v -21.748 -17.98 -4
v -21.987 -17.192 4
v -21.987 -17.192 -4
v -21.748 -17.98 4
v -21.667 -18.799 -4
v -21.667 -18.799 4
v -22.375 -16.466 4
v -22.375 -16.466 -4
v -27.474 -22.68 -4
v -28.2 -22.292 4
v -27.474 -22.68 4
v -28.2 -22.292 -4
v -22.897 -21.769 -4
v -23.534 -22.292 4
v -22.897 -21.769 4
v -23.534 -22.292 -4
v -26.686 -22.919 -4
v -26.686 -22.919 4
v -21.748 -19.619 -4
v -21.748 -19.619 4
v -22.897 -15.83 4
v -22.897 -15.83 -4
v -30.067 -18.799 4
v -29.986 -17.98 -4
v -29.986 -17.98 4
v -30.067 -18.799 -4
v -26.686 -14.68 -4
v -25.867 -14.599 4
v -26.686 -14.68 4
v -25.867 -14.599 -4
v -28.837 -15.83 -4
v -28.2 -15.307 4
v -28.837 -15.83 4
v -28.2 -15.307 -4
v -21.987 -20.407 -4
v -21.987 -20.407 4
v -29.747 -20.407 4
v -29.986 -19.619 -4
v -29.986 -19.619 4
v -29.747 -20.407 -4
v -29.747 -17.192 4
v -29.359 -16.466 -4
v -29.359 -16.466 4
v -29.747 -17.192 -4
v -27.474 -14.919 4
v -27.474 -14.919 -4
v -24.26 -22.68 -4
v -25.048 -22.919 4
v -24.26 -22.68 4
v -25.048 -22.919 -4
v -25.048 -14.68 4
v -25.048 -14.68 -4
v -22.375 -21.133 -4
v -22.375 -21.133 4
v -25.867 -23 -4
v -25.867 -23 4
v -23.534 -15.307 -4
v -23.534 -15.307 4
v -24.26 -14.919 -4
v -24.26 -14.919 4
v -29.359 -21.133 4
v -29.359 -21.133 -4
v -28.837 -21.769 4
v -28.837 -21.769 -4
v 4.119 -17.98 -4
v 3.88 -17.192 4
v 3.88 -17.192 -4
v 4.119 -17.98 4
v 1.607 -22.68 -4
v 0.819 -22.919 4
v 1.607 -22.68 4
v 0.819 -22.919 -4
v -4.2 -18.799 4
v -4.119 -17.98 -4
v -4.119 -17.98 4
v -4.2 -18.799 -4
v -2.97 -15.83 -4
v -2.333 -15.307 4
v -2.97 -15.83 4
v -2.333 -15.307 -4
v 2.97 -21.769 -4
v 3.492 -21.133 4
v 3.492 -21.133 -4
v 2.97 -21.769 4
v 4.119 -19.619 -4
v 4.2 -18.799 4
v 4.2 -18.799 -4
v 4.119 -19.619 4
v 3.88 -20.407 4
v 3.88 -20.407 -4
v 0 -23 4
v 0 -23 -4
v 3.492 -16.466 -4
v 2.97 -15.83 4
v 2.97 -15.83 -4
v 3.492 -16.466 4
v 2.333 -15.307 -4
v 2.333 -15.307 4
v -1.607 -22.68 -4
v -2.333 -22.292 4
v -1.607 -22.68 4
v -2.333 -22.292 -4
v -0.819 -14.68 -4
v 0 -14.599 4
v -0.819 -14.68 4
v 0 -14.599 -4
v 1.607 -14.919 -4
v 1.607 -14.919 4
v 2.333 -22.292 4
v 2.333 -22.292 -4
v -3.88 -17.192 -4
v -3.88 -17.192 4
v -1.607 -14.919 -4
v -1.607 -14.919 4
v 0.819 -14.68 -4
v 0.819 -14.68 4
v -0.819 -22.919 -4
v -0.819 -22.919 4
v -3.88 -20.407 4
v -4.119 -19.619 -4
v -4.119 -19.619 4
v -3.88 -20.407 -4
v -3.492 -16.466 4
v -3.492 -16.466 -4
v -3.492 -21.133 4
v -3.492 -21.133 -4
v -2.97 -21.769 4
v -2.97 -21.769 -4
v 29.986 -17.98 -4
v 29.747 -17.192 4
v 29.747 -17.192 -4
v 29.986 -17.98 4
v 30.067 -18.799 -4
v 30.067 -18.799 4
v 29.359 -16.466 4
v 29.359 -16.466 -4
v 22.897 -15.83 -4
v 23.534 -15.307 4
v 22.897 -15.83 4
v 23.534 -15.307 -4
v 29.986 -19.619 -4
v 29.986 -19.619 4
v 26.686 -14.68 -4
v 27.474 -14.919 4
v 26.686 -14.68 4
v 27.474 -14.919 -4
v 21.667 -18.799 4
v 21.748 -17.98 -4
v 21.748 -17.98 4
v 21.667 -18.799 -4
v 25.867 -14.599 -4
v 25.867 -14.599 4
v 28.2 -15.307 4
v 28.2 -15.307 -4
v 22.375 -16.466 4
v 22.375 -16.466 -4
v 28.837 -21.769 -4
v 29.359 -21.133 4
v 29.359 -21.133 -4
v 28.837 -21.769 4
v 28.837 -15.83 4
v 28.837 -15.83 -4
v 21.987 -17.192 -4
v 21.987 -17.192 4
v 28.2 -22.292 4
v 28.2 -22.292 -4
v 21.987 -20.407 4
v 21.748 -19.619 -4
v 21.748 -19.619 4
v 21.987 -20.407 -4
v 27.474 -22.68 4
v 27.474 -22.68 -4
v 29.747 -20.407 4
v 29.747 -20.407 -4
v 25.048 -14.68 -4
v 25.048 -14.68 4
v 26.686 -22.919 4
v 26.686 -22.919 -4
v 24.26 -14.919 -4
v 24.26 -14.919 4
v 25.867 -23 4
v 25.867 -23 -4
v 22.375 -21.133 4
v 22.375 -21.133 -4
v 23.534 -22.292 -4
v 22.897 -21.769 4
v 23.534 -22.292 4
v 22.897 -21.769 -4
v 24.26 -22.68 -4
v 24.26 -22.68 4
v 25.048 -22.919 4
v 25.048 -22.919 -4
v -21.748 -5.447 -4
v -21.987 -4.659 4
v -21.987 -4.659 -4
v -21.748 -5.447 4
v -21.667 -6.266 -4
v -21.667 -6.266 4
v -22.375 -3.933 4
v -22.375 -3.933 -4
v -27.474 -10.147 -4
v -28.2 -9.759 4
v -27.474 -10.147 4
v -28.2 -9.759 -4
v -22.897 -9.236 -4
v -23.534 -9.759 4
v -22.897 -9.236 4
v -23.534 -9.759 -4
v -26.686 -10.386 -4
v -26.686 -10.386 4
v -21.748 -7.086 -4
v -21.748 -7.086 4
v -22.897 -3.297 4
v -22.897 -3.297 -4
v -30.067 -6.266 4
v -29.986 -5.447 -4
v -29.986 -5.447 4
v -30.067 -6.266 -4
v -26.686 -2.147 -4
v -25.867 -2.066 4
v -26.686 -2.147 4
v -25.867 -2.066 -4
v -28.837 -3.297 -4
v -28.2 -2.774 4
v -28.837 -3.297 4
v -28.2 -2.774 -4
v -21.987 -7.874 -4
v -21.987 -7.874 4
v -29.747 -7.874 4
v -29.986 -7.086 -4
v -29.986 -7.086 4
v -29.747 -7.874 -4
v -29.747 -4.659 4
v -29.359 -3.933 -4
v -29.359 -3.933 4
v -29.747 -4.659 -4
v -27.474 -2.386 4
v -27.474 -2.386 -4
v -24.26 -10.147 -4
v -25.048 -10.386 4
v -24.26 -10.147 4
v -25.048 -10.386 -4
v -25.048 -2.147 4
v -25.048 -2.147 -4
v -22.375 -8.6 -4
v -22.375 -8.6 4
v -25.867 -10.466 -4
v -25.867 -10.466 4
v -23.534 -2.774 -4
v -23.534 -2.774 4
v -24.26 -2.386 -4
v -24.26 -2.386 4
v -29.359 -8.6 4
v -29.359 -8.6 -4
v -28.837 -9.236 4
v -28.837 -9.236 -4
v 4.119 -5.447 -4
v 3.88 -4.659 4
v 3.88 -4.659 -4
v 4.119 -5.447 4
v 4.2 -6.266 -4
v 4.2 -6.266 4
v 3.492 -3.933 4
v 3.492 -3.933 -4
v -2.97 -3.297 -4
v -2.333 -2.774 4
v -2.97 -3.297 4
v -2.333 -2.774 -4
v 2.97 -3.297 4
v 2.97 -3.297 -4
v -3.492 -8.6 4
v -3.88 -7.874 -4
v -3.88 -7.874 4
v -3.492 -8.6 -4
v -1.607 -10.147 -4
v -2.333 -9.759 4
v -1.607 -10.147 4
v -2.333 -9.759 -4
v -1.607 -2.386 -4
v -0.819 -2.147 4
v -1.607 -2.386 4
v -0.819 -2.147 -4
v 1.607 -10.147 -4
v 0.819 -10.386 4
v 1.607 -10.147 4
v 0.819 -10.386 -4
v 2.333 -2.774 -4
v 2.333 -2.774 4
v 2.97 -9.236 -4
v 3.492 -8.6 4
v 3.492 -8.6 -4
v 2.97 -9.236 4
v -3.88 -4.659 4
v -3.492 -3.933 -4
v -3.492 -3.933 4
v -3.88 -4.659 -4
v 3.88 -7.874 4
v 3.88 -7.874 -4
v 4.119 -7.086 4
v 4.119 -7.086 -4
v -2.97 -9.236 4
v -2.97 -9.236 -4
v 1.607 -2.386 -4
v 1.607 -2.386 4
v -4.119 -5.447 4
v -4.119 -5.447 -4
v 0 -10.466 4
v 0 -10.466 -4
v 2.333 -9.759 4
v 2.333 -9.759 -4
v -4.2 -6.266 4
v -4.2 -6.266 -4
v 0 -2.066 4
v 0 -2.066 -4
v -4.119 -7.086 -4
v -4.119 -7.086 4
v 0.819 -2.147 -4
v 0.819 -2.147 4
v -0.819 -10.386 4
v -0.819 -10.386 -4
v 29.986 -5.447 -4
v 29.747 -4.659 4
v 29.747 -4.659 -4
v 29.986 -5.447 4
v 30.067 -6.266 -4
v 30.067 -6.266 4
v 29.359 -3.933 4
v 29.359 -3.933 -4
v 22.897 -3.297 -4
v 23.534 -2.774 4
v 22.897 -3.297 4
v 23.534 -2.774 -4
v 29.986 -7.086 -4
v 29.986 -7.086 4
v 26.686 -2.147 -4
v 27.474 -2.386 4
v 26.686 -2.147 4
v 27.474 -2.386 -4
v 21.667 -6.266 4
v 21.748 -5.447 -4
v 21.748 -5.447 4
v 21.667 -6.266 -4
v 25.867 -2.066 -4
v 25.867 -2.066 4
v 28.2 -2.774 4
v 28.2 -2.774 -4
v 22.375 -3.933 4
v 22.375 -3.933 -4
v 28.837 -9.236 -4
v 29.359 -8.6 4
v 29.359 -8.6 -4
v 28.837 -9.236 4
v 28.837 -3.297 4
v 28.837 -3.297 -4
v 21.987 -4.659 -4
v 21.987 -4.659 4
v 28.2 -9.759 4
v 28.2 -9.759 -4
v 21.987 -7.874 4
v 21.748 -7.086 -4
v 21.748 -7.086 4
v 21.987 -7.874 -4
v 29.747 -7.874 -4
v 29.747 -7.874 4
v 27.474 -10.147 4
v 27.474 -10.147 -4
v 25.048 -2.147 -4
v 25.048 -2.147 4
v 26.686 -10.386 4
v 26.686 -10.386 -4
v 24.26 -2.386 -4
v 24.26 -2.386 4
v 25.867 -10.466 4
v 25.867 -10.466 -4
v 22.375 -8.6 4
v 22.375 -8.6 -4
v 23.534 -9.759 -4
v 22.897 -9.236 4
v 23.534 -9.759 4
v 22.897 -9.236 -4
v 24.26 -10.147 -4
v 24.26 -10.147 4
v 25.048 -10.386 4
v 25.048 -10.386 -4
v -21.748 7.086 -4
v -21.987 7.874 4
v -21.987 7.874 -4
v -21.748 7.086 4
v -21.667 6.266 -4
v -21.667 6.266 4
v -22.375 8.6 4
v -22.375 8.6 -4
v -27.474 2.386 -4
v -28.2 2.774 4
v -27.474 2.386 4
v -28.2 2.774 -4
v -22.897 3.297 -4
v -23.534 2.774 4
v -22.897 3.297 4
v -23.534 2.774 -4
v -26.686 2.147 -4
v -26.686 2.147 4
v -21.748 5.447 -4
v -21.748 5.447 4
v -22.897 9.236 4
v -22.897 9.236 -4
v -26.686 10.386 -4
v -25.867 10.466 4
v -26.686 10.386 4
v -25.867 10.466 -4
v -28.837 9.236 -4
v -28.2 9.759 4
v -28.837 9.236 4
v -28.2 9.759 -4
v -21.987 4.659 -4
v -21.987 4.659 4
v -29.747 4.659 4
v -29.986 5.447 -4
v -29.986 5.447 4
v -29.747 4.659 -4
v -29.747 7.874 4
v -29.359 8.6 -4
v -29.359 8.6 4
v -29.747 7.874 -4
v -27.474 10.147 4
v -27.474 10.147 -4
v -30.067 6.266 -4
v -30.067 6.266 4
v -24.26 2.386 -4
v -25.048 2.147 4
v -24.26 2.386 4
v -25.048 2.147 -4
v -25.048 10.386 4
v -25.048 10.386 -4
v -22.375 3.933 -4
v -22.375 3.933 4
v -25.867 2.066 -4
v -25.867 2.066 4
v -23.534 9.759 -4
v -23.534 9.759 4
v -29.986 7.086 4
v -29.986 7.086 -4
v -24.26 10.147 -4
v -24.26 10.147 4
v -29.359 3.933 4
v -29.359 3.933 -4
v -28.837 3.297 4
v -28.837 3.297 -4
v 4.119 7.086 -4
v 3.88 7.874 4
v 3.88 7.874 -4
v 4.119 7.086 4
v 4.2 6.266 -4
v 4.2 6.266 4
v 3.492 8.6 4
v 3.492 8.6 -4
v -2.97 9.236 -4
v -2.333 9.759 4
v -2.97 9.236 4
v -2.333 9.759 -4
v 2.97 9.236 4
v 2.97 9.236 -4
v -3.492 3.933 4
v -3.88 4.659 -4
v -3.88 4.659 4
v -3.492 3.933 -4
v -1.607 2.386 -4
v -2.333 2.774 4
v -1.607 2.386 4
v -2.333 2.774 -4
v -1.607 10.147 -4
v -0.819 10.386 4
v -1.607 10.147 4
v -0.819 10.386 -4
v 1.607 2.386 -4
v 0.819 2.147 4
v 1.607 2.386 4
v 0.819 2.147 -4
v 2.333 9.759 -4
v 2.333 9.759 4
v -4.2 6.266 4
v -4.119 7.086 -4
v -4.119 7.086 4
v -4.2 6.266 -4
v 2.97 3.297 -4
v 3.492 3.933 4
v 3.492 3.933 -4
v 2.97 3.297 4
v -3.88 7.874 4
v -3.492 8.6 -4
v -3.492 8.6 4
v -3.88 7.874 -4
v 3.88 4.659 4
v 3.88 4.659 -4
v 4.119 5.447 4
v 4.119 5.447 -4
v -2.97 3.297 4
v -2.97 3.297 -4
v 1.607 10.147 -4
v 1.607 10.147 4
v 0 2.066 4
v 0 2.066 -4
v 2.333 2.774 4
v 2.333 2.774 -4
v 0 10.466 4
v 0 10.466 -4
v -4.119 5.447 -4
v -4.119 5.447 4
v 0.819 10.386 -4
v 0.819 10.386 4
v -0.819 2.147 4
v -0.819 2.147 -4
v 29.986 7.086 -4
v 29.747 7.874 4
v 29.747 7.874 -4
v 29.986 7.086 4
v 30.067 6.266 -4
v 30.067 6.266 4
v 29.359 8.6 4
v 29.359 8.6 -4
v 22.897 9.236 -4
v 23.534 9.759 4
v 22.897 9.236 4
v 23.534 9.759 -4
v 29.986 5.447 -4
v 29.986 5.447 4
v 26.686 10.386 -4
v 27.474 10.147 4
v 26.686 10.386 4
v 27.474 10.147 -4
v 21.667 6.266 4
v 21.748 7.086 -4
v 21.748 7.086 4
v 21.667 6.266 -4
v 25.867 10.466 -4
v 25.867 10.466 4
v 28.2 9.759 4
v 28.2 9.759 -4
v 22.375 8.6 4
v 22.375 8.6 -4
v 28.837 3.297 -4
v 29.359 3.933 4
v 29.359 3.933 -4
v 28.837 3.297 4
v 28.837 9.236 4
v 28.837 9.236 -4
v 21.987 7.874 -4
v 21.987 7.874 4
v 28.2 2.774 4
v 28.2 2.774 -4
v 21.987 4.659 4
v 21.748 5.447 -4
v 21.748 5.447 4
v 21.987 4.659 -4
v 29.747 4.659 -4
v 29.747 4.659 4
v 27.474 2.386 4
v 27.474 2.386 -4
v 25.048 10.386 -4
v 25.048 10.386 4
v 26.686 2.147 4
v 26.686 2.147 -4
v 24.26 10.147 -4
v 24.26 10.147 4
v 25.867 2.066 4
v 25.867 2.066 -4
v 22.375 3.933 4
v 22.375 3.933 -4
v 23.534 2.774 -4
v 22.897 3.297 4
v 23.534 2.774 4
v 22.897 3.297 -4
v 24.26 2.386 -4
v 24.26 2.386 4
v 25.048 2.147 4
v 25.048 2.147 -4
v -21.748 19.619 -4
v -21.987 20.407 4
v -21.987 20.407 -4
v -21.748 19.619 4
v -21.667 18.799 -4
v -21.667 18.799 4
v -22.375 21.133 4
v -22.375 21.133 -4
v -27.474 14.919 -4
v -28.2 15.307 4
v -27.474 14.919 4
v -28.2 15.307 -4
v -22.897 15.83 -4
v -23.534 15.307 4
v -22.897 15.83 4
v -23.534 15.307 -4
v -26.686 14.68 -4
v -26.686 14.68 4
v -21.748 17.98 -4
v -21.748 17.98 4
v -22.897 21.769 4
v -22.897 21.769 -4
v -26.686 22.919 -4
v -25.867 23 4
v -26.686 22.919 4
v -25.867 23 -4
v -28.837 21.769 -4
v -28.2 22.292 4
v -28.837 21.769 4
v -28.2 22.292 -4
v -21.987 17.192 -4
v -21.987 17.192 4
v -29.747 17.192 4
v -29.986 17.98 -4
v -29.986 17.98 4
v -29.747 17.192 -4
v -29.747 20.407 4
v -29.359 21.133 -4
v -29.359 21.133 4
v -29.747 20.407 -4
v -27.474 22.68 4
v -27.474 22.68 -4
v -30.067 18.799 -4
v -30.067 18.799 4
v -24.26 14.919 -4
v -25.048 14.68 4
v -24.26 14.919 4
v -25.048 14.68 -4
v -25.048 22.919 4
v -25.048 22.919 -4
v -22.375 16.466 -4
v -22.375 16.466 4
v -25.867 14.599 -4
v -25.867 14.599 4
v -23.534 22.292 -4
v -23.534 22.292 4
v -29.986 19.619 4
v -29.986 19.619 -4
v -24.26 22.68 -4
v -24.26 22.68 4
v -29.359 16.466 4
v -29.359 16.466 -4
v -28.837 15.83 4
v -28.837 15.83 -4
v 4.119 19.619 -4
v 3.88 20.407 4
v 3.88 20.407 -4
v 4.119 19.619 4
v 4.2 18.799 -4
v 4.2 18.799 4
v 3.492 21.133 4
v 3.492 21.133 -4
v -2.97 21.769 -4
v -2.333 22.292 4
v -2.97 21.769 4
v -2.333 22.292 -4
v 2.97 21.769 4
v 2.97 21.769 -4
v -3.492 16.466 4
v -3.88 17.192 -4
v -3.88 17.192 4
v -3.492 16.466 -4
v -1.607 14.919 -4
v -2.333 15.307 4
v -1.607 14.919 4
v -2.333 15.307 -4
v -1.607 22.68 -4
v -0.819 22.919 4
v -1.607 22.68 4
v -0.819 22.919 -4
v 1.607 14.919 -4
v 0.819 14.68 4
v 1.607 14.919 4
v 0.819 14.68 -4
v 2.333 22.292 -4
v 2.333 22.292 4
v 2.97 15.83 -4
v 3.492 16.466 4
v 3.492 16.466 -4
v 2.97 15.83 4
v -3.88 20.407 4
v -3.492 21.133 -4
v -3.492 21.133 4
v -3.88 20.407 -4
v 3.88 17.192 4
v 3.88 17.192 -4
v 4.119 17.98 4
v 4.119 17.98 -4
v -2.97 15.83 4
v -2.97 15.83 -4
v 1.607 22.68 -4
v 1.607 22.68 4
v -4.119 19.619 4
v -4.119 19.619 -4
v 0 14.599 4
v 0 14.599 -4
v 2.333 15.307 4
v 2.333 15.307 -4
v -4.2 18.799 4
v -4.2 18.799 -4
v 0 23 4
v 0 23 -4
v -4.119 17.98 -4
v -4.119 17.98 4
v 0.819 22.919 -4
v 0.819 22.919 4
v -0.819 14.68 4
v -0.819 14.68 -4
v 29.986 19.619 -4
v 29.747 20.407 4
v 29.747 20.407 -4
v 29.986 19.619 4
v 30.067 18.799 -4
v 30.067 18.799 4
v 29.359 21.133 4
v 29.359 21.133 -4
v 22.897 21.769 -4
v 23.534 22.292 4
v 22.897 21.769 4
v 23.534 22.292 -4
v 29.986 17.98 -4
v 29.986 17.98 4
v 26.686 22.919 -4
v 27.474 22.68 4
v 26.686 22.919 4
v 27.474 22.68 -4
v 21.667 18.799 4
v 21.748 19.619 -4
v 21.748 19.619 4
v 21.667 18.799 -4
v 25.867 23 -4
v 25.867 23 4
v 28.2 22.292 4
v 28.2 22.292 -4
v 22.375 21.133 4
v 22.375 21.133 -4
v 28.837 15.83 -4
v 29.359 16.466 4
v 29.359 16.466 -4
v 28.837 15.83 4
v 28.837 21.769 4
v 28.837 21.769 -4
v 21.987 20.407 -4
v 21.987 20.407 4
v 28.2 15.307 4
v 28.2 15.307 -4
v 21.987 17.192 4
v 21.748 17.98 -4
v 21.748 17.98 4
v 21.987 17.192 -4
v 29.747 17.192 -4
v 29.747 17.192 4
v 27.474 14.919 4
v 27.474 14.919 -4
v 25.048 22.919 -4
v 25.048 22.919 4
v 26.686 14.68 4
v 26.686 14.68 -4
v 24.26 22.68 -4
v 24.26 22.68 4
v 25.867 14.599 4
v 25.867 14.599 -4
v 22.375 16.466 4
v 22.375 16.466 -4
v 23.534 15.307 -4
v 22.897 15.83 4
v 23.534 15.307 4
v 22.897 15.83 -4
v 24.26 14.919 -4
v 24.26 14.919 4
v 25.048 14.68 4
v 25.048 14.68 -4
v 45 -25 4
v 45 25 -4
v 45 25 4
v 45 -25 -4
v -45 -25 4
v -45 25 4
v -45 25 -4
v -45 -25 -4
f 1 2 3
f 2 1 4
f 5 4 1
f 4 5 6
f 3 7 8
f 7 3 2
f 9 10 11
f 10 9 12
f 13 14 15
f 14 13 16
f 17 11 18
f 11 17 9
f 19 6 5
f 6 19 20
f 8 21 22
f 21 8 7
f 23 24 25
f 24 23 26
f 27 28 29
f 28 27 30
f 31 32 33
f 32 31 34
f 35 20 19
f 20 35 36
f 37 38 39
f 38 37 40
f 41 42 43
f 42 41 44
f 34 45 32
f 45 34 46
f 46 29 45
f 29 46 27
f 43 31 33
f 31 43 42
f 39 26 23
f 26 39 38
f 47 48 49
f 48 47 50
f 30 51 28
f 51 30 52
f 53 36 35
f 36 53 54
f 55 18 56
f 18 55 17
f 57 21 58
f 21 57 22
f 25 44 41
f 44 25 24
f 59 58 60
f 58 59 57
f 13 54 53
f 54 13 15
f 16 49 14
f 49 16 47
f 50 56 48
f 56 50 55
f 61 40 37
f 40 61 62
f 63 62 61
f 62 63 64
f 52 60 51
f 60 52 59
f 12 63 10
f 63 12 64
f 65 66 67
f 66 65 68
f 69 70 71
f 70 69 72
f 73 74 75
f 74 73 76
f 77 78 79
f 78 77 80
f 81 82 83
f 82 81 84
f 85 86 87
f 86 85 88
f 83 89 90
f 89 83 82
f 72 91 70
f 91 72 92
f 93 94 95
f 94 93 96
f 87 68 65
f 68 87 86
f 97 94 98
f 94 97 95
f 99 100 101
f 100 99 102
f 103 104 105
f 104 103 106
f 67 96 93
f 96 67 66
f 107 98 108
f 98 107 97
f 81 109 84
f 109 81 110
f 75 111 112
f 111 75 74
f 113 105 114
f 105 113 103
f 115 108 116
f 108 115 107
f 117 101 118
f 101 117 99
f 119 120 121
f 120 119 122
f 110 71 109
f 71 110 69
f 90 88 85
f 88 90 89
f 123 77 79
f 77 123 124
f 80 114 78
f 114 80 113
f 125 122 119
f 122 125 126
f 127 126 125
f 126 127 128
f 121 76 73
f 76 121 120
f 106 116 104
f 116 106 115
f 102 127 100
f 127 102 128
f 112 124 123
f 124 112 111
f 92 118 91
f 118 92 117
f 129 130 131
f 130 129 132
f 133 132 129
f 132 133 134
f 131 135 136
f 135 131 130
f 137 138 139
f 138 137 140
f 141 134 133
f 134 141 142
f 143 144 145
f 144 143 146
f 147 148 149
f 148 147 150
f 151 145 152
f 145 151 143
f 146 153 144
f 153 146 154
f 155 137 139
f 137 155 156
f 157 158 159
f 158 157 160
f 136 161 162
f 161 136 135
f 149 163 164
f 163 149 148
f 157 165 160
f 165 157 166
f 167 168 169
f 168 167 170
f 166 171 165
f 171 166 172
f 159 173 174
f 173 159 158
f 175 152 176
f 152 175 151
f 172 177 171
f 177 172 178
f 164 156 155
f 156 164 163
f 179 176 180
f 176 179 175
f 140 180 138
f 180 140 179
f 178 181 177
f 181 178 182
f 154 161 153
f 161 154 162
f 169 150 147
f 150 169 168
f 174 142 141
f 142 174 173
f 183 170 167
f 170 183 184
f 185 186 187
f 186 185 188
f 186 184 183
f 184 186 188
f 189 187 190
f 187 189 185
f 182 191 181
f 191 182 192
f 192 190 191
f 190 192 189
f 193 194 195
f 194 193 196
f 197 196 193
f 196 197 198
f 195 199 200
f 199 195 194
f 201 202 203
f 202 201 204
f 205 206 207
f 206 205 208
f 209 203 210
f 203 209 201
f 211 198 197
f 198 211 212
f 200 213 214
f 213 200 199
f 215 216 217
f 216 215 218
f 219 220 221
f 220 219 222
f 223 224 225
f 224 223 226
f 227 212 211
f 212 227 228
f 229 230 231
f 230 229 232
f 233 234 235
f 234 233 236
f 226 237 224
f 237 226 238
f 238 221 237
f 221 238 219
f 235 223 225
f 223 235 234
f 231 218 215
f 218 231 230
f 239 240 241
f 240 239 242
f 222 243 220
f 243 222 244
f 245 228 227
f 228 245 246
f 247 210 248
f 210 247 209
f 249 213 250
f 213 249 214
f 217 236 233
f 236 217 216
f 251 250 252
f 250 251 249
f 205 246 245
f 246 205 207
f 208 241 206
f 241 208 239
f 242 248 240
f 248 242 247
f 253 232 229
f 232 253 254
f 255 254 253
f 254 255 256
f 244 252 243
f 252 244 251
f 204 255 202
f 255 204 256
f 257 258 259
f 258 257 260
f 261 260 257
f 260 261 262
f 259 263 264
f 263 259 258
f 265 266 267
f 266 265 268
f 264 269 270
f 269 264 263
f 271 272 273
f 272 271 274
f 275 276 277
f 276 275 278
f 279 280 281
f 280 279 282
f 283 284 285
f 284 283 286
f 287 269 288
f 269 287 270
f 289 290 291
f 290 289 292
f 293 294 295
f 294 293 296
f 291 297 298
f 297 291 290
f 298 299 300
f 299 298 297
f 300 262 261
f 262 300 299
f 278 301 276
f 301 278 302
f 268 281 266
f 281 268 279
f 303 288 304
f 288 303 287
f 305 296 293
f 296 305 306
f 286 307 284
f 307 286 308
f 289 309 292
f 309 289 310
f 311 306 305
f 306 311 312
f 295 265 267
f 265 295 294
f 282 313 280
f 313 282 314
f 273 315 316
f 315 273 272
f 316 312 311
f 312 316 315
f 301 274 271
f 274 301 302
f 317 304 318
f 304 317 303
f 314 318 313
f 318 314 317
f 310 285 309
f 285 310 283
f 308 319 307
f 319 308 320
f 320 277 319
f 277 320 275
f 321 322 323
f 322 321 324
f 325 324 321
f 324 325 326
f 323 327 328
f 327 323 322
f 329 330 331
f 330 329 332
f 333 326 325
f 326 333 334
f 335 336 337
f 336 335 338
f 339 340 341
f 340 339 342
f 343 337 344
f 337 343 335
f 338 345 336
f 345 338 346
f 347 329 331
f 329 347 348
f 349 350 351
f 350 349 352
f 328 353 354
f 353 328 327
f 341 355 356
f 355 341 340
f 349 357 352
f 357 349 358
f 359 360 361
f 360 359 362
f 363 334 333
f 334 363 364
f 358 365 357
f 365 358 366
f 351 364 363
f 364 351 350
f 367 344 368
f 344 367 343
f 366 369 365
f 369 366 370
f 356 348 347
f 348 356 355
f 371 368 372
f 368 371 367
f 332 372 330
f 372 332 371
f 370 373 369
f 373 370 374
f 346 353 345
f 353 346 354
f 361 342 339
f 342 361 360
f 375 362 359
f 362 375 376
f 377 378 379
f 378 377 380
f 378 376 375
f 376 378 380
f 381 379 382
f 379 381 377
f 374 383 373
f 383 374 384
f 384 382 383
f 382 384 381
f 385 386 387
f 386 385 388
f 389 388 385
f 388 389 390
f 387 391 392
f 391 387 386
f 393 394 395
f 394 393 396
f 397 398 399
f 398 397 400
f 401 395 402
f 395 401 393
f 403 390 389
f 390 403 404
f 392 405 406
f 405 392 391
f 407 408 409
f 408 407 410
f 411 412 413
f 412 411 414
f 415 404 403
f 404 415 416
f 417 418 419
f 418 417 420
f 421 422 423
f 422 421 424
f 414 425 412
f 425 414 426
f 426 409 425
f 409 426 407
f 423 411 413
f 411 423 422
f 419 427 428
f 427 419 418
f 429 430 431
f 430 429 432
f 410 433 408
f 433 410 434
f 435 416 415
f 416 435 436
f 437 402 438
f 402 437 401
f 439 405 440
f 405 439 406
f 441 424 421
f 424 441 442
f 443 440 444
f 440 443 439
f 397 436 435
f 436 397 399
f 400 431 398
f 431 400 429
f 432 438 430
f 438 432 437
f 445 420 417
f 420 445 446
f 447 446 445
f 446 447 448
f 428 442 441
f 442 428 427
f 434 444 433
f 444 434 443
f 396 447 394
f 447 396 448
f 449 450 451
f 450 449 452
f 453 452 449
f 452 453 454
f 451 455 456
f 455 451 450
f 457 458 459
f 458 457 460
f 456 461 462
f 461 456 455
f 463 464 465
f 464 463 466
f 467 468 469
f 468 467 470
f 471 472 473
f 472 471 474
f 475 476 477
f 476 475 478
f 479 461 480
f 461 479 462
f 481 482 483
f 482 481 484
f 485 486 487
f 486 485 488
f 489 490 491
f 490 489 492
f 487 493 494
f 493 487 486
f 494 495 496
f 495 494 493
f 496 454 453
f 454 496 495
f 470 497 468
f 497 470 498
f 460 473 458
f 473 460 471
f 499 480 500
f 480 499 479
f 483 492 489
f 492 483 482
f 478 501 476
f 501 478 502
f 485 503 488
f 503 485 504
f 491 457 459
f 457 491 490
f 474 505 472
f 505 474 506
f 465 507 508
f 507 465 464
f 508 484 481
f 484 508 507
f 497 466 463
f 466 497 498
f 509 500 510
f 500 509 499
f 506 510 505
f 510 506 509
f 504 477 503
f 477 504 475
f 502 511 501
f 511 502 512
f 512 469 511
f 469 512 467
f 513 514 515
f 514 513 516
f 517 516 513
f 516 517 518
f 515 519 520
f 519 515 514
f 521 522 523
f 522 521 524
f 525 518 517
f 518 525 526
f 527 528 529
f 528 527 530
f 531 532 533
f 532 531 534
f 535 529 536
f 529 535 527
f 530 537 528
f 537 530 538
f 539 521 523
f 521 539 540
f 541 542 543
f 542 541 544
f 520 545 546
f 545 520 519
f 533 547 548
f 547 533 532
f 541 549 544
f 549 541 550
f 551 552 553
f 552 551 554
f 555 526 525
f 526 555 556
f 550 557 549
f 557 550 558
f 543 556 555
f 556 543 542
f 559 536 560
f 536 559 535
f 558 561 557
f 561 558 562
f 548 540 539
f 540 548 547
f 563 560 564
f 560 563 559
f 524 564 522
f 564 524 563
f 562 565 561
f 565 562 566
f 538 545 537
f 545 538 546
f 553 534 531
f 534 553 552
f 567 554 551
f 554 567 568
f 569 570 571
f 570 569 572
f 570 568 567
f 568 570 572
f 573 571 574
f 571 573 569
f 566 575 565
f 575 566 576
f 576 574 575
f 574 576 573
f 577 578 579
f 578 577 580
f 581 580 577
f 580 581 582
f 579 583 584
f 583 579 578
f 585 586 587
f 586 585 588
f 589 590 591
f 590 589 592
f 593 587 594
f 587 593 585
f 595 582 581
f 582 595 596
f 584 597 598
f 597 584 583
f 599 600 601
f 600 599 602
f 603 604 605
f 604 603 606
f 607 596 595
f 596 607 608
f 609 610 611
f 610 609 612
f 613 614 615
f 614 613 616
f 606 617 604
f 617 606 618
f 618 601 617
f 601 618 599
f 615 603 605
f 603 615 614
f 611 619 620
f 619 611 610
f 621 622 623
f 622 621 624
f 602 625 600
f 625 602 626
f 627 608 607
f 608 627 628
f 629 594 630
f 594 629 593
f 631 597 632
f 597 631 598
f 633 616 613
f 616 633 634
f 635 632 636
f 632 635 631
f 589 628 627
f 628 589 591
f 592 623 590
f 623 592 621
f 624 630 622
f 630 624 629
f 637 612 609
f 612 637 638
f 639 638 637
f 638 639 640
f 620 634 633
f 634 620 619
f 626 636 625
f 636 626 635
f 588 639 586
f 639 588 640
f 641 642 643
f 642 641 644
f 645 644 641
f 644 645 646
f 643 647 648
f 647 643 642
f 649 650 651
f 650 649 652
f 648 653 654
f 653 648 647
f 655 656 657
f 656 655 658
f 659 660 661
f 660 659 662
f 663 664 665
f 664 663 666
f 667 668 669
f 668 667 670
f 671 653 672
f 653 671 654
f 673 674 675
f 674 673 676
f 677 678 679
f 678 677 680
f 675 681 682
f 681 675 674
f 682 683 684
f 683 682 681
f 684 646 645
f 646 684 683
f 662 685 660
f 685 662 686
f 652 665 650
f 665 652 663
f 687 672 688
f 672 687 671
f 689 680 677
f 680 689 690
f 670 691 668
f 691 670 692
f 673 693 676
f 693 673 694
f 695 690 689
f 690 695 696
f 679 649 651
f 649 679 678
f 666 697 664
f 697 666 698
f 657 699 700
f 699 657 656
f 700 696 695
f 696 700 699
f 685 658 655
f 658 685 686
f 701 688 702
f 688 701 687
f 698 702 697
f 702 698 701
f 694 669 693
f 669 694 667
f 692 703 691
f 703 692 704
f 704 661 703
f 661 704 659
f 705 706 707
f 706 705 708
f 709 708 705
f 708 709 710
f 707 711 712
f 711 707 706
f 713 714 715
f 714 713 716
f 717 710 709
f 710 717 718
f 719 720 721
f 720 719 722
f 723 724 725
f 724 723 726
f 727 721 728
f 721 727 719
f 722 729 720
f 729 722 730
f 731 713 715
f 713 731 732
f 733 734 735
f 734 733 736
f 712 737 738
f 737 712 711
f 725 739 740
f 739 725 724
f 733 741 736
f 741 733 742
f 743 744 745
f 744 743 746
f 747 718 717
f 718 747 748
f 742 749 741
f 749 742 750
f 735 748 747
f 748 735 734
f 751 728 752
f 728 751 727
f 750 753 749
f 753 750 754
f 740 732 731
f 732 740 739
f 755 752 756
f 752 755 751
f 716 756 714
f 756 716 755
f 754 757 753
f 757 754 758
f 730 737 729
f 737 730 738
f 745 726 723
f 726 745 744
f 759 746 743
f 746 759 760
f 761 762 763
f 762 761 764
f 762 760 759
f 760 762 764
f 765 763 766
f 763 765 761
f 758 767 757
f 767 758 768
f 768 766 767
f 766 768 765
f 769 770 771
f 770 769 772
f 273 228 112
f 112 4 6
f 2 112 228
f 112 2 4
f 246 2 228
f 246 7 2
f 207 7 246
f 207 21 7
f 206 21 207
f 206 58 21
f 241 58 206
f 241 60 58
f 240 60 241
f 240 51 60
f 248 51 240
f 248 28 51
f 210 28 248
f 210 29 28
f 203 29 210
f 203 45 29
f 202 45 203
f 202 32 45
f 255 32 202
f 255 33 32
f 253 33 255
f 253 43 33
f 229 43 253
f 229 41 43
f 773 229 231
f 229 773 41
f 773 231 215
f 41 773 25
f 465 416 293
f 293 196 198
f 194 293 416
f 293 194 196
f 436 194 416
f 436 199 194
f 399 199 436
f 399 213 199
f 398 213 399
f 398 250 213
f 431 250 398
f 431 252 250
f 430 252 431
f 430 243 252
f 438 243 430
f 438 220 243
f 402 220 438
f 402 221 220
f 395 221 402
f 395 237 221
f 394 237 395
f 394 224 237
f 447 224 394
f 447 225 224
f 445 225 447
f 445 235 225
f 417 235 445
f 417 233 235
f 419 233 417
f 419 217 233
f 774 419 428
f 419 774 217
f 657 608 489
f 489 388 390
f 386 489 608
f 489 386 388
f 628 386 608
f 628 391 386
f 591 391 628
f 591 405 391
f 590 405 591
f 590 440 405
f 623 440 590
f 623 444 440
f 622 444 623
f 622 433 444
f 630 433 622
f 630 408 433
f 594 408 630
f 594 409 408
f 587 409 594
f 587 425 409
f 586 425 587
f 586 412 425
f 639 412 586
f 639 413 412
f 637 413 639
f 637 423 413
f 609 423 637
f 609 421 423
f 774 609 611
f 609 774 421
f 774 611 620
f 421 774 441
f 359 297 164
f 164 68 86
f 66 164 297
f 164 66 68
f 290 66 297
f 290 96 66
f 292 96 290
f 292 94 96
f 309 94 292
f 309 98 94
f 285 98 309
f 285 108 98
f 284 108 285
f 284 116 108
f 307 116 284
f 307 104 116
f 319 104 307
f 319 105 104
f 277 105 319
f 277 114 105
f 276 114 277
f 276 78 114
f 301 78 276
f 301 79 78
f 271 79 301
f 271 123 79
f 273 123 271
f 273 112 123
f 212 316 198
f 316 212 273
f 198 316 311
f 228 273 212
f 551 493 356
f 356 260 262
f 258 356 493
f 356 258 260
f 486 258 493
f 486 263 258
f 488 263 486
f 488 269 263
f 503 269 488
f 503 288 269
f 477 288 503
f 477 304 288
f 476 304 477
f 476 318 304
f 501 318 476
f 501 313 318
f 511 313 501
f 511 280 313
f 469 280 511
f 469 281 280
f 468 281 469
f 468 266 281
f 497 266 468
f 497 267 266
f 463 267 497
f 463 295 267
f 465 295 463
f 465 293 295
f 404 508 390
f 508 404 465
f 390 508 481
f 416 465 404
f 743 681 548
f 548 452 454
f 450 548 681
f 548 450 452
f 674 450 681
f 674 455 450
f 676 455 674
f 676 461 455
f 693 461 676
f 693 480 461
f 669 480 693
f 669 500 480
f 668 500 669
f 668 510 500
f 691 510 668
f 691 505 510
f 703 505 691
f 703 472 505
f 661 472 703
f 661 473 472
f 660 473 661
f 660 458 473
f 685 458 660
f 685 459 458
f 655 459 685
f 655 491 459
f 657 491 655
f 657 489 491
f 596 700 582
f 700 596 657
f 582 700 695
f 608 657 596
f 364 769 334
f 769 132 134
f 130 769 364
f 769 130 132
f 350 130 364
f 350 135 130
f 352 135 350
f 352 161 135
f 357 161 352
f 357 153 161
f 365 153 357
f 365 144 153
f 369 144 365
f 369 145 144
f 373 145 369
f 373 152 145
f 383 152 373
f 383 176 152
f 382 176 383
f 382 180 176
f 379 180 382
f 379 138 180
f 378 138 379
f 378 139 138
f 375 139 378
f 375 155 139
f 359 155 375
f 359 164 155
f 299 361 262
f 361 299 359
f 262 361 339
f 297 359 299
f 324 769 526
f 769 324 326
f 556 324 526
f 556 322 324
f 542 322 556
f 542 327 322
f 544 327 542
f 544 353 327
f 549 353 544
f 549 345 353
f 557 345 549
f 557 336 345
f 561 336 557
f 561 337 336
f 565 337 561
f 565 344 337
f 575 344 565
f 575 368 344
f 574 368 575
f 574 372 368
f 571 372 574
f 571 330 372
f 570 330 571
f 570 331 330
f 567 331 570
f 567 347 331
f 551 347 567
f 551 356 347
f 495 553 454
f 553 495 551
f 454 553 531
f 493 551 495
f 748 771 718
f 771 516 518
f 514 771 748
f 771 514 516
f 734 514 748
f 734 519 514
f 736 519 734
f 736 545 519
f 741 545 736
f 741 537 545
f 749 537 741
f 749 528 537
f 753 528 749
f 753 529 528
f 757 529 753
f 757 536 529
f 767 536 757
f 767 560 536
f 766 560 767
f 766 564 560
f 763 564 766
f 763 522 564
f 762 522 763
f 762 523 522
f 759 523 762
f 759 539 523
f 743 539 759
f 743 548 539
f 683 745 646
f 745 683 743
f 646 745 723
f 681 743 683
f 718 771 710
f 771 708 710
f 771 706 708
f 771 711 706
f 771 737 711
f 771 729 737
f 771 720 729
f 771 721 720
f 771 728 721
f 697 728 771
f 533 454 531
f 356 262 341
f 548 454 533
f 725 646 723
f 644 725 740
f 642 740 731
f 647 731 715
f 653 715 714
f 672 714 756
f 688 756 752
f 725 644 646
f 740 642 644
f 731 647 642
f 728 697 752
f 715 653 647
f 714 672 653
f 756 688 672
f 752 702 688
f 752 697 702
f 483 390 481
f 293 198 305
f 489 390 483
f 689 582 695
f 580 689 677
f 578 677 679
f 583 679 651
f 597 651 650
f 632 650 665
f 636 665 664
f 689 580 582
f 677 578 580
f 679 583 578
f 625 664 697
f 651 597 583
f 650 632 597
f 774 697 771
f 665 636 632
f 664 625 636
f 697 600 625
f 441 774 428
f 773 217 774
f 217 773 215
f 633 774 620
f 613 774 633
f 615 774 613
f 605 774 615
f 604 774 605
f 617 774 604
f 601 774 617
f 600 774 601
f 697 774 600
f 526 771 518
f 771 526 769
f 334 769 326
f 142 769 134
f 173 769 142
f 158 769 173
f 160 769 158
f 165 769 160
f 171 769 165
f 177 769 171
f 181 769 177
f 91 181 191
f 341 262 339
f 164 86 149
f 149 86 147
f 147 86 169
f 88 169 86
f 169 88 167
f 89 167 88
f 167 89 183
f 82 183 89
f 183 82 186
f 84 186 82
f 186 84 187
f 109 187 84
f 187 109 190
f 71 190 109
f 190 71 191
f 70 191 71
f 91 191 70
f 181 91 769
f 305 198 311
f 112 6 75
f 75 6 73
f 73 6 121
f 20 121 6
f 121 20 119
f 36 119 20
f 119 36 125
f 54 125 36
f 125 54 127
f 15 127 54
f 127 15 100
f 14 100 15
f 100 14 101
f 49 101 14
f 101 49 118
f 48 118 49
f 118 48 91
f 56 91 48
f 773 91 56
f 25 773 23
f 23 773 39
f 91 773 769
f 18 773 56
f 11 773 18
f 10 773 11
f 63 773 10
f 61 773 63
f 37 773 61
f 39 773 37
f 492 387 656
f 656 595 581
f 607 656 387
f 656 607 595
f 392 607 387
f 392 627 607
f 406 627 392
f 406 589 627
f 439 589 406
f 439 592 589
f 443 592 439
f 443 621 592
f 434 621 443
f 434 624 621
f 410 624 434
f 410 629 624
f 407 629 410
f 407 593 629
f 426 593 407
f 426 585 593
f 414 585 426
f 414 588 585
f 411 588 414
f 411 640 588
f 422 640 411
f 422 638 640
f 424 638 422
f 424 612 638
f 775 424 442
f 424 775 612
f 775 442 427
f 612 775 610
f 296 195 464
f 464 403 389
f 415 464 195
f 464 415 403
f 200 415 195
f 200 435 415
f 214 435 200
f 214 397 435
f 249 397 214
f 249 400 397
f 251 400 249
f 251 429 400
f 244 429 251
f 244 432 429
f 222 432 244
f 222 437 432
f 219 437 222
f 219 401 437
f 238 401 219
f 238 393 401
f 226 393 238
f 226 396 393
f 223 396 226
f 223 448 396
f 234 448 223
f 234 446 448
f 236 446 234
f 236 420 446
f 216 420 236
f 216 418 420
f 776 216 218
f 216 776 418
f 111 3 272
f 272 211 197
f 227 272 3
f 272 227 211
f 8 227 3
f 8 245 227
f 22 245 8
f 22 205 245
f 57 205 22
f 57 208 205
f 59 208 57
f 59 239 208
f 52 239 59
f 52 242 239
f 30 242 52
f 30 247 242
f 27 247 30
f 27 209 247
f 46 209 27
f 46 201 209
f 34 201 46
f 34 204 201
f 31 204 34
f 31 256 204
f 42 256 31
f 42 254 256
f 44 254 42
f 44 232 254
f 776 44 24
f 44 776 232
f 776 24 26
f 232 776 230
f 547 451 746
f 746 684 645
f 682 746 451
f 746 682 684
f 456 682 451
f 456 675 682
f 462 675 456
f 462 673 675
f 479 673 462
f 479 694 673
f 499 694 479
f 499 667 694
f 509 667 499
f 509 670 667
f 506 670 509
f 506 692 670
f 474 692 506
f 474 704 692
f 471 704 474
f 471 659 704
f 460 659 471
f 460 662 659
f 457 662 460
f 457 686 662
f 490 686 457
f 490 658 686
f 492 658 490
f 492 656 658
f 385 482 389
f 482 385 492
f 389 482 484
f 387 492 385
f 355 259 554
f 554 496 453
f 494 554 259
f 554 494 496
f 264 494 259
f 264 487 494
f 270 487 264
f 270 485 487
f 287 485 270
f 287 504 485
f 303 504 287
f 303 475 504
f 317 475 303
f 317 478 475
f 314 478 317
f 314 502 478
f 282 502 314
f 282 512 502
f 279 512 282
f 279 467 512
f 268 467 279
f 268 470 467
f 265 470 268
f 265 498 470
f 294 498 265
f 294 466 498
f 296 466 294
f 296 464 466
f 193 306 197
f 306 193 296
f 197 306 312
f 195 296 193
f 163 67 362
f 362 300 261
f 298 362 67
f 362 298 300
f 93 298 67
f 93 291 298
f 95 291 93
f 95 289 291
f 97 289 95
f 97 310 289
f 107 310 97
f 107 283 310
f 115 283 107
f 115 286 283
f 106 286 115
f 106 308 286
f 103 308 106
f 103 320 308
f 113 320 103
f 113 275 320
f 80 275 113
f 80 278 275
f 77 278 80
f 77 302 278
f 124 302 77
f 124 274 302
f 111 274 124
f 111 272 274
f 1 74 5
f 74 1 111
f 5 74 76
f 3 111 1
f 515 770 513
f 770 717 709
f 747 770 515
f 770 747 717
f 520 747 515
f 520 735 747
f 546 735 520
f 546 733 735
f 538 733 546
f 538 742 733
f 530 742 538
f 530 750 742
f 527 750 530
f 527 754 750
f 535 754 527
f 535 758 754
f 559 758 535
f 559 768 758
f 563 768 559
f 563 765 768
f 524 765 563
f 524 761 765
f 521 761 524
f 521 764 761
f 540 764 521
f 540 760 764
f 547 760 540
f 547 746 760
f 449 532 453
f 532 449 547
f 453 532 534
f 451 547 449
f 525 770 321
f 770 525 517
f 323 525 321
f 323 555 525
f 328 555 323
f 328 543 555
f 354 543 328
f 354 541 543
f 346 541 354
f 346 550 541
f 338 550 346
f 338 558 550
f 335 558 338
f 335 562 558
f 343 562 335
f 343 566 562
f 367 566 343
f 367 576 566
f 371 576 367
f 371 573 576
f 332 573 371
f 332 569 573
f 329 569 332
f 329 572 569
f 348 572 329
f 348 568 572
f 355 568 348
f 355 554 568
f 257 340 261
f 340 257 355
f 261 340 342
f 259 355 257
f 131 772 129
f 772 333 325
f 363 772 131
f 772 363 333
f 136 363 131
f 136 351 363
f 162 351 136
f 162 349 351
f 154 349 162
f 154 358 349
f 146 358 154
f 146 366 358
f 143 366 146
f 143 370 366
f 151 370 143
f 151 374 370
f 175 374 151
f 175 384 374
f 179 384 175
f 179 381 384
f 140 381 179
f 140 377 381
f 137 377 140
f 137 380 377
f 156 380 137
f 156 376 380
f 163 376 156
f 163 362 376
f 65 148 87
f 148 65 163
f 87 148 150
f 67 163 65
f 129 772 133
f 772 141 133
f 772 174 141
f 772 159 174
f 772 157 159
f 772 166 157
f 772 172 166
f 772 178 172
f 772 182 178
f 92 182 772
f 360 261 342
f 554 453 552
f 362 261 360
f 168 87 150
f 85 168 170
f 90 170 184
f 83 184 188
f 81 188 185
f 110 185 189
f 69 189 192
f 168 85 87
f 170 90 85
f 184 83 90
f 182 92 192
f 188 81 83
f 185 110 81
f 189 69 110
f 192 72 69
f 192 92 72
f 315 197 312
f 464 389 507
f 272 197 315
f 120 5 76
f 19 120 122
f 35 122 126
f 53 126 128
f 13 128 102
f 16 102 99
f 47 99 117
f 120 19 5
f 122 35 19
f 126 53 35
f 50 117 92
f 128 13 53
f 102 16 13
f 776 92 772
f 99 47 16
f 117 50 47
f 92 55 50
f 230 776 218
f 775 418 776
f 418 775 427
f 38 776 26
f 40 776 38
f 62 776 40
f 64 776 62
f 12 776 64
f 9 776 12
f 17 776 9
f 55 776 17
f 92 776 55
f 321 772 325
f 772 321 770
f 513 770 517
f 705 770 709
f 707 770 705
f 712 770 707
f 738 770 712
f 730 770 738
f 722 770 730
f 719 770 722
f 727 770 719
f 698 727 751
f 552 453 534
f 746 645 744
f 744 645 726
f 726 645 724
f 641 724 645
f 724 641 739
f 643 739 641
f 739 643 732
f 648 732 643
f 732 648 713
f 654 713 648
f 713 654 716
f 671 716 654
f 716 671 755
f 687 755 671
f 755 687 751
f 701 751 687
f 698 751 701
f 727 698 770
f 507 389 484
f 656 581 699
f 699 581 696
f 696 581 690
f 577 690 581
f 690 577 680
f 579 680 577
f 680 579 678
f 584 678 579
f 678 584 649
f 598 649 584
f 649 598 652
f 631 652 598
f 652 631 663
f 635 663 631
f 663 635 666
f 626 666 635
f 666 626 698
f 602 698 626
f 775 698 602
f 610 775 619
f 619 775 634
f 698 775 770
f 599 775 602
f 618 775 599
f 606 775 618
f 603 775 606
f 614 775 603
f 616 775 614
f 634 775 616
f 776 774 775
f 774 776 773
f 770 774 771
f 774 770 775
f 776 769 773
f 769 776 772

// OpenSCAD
$fn = 32;

// ----------------------------------------------------------------------
// Perforated panel 90 x 50 x 8
// 4 x 3 Ø8.4 holes, grid layout
// ----------------------------------------------------------------------

// --- parameters (mm) ---
panel = [90, 50, 8];  // overall size (x, y, z)
hole_d = 8.4;         // hole diameter
pitch_x = 25.867;     // hole pitch along X
pitch_y = 12.533;     // hole pitch along Y

// --- derived feature positions (mm) ---
margin = hole_d / 2 + 2;            // = 6.2   clearance from the panel edge
cols = floor((panel[0] - 2 * margin) / pitch_x) + 1;  // = 3   how many columns fit in X
rows = floor((panel[1] - 2 * margin) / pitch_y) + 1;  // = 4   how many rows fit in Y
span_x = (cols - 1) * pitch_x + 0;  // = 51.73   width of the field
span_y = (rows - 1) * pitch_y;      // = 37.6   height of the field
origin_x = -span_x / 2;             // = -25.87   X of the first hole
origin_y = -span_y / 2;             // = -18.8   Y of the first row
holes = rows * cols;                // = 12   holes in total
feature_centers = [
  [origin_x + 0 * pitch_x, origin_y + 0 * pitch_y],
  [origin_x + 1 * pitch_x, origin_y + 0 * pitch_y],
  [origin_x + 2 * pitch_x, origin_y + 0 * pitch_y],
  [origin_x + 0 * pitch_x, origin_y + 1 * pitch_y],
  [origin_x + 1 * pitch_x, origin_y + 1 * pitch_y],
  [origin_x + 2 * pitch_x, origin_y + 1 * pitch_y],
  [origin_x + 0 * pitch_x, origin_y + 2 * pitch_y],
  [origin_x + 1 * pitch_x, origin_y + 2 * pitch_y],
  [origin_x + 2 * pitch_x, origin_y + 2 * pitch_y],
  [origin_x + 0 * pitch_x, origin_y + 3 * pitch_y],
  [origin_x + 1 * pitch_x, origin_y + 3 * pitch_y],
  [origin_x + 2 * pitch_x, origin_y + 3 * pitch_y]
];   // hole centres, used verbatim by the cutter loop

// panel outline, every hole through
difference() {
  cube(panel, center = true);
  for (centre = feature_centers)
    translate([centre[0], centre[1], 0])
      cylinder(d = hole_d, h = panel[2] + 2, center = true);
}
